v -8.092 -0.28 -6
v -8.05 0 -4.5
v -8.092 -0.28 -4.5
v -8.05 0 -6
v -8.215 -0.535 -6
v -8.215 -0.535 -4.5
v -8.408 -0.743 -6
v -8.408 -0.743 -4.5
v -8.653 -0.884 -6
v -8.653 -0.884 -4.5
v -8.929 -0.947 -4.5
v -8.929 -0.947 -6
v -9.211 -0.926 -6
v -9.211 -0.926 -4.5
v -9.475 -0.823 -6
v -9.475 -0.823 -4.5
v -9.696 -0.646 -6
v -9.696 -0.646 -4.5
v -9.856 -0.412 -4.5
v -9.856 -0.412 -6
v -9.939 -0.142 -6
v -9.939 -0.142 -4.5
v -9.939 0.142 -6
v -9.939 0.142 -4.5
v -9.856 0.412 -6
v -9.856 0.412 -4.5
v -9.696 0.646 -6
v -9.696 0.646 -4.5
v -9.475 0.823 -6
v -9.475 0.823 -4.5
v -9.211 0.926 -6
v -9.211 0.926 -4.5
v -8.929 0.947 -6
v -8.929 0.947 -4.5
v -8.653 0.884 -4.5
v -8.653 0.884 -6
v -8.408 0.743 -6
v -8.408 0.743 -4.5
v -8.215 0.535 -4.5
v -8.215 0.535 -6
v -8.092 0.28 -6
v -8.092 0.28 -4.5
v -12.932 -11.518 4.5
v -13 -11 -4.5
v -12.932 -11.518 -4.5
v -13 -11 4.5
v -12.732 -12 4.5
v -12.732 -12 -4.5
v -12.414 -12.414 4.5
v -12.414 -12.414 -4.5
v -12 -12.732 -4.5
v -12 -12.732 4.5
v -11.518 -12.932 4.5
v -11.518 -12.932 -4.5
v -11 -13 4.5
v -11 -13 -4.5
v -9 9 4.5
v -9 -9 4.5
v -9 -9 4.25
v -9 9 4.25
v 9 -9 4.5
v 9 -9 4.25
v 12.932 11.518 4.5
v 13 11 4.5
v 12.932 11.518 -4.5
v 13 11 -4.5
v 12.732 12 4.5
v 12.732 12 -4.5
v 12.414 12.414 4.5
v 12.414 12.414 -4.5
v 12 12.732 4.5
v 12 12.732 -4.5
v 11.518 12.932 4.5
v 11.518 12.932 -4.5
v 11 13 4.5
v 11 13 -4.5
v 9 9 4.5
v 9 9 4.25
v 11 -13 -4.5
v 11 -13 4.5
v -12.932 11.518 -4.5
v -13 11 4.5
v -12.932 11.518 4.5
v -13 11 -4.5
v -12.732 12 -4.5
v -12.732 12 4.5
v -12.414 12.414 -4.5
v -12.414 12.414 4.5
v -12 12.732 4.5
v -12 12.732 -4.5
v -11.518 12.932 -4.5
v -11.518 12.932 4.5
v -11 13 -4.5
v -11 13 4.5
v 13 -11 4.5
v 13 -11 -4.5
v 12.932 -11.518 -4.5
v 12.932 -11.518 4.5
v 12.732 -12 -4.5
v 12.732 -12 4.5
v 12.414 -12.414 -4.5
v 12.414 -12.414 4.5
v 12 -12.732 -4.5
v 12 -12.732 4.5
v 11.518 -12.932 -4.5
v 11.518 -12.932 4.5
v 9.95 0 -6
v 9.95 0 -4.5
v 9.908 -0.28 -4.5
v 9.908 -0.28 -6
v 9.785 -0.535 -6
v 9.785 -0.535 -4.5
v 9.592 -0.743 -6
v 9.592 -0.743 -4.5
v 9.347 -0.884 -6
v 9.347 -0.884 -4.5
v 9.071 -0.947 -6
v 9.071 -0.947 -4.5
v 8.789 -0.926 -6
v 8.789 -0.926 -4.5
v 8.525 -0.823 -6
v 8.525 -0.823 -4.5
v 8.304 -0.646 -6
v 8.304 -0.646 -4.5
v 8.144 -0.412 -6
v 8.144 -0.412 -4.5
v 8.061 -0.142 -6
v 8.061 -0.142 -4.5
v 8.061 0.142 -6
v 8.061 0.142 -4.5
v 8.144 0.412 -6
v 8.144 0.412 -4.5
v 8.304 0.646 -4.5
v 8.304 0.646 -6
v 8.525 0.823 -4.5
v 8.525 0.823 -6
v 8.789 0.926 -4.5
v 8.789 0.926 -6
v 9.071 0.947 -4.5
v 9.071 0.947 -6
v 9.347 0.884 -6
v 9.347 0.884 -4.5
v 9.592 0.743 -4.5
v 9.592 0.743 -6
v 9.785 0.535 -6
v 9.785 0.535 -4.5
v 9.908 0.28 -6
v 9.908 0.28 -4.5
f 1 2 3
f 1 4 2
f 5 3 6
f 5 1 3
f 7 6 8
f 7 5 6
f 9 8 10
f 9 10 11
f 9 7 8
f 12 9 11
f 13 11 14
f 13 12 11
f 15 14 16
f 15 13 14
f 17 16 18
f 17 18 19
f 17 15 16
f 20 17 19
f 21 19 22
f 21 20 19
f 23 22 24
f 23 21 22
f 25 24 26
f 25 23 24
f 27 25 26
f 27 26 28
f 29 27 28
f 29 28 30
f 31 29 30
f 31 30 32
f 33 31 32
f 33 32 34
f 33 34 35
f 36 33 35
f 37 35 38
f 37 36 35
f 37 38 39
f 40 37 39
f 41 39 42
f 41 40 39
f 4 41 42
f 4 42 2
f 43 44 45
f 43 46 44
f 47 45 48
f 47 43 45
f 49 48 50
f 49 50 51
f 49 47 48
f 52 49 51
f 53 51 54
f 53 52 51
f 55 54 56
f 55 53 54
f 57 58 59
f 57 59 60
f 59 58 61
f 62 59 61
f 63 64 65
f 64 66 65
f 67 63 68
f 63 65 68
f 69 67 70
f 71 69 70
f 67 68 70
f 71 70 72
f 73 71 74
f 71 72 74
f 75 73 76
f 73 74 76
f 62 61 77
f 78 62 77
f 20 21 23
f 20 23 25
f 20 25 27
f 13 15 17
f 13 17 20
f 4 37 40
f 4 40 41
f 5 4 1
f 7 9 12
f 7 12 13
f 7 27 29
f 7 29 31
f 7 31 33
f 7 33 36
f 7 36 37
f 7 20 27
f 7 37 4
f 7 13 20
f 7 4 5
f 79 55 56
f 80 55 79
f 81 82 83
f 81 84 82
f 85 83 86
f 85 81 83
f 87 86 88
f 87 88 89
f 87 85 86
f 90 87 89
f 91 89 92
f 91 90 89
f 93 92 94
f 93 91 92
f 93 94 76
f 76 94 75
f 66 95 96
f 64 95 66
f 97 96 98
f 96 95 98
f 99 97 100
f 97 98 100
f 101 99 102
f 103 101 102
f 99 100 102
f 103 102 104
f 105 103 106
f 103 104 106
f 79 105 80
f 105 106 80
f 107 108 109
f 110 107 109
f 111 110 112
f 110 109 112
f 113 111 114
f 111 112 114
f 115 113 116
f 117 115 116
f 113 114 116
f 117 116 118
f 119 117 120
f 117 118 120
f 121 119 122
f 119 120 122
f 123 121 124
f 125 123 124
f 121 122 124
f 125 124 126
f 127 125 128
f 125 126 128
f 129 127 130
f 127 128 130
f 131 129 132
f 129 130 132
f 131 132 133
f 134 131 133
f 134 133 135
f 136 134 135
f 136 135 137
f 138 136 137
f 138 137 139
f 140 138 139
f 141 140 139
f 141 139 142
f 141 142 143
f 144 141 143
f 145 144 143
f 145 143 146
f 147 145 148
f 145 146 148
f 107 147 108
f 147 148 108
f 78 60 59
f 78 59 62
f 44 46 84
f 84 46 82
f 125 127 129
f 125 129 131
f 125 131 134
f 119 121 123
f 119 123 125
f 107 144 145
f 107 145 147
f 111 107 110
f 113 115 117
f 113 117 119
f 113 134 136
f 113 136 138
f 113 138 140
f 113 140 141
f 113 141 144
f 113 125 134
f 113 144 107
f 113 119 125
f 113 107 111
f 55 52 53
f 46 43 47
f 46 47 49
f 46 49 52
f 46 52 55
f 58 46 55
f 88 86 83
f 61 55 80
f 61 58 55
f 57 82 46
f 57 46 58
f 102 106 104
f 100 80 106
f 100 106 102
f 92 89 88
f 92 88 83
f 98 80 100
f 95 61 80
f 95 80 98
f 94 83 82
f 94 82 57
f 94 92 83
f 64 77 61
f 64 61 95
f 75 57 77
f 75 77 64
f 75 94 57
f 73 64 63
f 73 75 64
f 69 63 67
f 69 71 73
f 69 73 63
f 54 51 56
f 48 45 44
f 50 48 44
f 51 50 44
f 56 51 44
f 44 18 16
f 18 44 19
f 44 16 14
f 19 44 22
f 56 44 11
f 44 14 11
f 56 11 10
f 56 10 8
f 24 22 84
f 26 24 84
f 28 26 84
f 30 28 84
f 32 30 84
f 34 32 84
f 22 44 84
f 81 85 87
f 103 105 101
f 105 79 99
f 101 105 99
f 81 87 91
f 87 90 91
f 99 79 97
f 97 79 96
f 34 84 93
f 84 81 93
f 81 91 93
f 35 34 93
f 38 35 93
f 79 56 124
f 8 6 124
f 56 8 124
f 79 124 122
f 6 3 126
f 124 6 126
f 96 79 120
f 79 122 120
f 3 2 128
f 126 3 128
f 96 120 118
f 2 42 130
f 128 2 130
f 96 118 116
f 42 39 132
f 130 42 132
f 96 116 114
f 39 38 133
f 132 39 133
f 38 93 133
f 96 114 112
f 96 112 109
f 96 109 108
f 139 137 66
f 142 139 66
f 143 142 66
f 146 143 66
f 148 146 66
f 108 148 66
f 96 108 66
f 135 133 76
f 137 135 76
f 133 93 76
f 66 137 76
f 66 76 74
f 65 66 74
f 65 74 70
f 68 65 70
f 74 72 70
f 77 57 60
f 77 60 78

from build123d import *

# Parameters (mm, degrees)
SKETCH1_W           = 26
SKETCH1_H           = 26
BOSS_EXTRUDE1_DEPTH = 4.5
FILLET1_R           = 2
SKETCH2_W           = 18
SKETCH2_H           = 18
CUT_EXTRUDE1_DEPTH  = 0.25
SKETCH3_R           = 0.95
BOSS_EXTRUDE2_DEPTH = 1.5


with BuildPart() as part:
    # Sketch1 → Boss-Extrude1 (new, symmetric)
    with BuildSketch(Plane.XY):
        Rectangle(SKETCH1_W, SKETCH1_H)
    extrude(amount=BOSS_EXTRUDE1_DEPTH, both=True)

    # Fillet1
    fillet1_edges = [part.edges().sort_by_distance(p)[0] for p in [
        (-13, 13, 0),
        (13, 13, 0),
        (13, -13, 0),
        (-13, -13, 0),
    ]]
    fillet(fillet1_edges, radius=FILLET1_R)

    # Sketch2 → Cut-Extrude1 (cut, symmetric)
    with BuildSketch(Plane.XY.offset(4.5)):
        Rectangle(SKETCH2_W, SKETCH2_H)
    extrude(amount=CUT_EXTRUDE1_DEPTH, both=True, mode=Mode.SUBTRACT)

    # Sketch3 → Boss-Extrude2 (add, symmetric)
    with BuildSketch(Plane(origin=(0, 0, -4.5), x_dir=(-1, 0, 0), z_dir=(0, 0, -1))):
        with Locations(Location((-9, 0, 0), (0, 0, 180))):
            Circle(SKETCH3_R)
        with Locations(Location((9, 0, 0), (0, 0, 180))):
            Circle(SKETCH3_R)
    extrude(amount=BOSS_EXTRUDE2_DEPTH, both=True)


solid = part.part
